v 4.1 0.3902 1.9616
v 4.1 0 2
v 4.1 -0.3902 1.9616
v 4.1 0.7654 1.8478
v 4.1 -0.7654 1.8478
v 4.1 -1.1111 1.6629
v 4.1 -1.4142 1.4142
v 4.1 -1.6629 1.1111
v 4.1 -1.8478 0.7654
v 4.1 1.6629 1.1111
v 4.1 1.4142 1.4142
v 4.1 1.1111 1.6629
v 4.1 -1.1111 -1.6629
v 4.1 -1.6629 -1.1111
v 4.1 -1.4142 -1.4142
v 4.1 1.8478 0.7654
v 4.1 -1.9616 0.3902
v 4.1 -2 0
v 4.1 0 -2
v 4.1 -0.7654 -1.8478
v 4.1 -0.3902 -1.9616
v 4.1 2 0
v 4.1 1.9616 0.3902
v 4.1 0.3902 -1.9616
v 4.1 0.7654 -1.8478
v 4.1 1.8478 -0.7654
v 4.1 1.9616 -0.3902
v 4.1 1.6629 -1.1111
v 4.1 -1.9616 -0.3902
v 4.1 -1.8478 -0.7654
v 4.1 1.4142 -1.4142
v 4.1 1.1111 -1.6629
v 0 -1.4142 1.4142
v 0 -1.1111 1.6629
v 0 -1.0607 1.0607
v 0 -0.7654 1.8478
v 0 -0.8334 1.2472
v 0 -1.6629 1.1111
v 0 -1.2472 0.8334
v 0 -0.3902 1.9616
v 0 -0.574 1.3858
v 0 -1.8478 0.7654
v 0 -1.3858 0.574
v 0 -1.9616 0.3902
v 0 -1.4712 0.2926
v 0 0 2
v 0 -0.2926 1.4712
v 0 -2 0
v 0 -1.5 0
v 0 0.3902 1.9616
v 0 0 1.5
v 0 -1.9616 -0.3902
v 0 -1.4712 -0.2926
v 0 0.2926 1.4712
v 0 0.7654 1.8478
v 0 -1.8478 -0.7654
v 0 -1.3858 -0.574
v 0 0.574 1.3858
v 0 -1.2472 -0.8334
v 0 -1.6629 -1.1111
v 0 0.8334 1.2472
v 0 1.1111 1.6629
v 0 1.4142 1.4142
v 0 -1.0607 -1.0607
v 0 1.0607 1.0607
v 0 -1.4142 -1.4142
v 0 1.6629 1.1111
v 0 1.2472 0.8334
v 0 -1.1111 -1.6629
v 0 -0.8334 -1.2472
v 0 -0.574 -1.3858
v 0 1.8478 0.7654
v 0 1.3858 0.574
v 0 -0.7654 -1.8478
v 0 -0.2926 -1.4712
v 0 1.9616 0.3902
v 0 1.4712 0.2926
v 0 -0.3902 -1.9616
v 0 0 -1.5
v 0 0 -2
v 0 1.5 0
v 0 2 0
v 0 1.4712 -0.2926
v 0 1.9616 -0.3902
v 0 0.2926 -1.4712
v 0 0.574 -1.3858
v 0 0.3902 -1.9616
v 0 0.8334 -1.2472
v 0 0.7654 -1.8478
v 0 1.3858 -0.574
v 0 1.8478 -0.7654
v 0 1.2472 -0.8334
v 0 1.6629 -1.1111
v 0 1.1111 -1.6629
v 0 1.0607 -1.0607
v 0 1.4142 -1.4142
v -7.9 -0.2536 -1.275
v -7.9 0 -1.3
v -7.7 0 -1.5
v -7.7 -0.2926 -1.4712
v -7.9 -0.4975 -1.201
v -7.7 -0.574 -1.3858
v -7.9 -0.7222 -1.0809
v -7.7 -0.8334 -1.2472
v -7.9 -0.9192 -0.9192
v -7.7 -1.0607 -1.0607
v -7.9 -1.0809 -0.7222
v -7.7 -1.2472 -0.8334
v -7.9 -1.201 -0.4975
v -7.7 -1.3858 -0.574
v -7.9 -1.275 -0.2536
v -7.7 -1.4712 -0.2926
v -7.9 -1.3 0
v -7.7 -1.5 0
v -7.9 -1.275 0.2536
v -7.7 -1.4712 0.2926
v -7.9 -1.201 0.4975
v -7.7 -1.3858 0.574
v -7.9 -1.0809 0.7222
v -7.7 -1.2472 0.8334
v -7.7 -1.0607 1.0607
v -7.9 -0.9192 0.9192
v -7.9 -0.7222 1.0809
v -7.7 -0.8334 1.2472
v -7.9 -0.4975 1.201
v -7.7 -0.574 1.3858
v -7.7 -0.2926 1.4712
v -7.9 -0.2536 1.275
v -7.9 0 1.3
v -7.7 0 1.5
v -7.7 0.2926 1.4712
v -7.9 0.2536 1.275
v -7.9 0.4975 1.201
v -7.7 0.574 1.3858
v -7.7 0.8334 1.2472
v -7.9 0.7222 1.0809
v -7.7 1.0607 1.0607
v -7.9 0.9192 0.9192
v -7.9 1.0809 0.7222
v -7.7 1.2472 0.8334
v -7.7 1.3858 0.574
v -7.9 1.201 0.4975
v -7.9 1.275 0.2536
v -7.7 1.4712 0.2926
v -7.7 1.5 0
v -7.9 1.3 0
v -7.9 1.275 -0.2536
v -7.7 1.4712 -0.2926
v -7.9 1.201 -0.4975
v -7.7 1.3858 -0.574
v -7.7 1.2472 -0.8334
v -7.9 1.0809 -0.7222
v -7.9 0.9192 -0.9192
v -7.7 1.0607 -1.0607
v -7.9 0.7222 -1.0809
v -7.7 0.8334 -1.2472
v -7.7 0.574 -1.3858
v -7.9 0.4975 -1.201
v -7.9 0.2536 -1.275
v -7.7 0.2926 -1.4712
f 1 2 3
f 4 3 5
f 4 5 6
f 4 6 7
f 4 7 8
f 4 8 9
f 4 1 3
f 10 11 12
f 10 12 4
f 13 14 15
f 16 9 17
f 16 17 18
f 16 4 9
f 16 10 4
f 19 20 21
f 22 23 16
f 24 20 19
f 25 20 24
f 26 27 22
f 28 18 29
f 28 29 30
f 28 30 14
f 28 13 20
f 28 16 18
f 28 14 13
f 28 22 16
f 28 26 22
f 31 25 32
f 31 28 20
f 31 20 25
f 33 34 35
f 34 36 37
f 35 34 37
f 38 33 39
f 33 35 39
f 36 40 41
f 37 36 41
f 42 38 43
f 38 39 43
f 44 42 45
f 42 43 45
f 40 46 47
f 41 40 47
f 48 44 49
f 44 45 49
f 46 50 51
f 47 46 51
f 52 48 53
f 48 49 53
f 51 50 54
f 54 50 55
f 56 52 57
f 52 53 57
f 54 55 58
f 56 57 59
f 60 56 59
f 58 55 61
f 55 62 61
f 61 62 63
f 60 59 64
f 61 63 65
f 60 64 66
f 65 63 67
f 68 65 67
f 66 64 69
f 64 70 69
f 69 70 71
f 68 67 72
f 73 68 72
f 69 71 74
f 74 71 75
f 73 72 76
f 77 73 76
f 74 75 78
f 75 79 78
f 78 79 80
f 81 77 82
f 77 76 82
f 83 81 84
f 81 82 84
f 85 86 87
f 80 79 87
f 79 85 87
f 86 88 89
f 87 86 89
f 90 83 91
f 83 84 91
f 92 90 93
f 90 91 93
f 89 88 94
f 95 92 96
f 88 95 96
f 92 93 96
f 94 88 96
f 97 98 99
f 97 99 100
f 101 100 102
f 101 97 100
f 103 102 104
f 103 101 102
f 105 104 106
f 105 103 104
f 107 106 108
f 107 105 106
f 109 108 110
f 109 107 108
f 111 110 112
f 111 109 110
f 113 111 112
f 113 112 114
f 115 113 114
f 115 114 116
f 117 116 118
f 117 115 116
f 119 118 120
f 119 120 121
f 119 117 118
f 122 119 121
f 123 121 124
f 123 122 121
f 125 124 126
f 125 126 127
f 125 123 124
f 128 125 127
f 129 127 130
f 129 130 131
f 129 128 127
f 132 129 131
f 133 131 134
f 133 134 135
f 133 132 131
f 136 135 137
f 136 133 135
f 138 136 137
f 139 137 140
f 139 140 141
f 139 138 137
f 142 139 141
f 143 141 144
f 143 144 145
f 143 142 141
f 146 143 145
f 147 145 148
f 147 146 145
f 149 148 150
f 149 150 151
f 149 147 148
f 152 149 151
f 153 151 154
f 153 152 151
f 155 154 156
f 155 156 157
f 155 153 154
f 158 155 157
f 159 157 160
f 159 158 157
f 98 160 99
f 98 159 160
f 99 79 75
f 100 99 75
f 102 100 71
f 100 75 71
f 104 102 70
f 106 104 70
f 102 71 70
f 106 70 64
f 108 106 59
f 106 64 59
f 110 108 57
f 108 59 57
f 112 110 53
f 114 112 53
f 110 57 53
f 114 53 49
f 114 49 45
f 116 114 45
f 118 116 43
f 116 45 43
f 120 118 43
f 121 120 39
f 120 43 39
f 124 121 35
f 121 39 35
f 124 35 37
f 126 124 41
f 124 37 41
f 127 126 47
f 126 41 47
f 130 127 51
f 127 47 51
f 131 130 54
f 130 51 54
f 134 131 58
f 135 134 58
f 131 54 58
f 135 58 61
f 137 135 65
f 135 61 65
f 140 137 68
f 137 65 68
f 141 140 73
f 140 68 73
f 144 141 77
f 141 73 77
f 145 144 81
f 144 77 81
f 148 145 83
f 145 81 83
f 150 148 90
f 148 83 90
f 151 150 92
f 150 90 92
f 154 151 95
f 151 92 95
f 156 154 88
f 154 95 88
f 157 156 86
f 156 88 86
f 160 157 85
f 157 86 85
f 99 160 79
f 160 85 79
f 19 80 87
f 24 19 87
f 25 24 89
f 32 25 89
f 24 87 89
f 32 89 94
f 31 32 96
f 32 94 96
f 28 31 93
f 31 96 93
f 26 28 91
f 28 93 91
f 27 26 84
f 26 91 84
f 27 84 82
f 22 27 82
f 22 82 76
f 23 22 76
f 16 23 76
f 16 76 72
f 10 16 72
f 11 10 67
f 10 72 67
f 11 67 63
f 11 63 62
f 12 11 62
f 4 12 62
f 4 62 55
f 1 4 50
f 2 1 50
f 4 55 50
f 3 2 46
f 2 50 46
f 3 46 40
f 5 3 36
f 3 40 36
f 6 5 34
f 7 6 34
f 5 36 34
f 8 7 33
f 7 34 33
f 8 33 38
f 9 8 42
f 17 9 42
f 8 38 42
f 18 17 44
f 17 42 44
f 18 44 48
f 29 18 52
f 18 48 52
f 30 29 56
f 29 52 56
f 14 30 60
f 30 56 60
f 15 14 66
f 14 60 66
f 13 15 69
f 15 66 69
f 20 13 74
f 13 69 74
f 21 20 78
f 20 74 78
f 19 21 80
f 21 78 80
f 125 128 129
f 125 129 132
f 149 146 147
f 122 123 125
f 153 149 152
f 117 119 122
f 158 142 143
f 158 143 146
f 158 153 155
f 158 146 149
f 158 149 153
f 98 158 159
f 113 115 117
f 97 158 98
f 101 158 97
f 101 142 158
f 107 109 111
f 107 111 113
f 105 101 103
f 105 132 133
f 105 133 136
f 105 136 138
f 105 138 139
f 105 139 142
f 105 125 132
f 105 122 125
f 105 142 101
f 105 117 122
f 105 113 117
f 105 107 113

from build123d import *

# Parameters (mm, degrees)
SKETCH1_R           = 2
BOSS_EXTRUDE1_DEPTH = 4.1
SKETCH2_R           = 1.5
BOSS_EXTRUDE2_DEPTH = 7.9
CHAMFER1_SIZE       = 0.2


with BuildPart() as part:
    # Sketch1 → Boss-Extrude1 (new body)
    with BuildSketch(Plane(origin=(0, 0, 0), x_dir=(0, 0, -1), z_dir=(1, 0, 0))):
        Circle(SKETCH1_R)
    extrude(amount=BOSS_EXTRUDE1_DEPTH)

    # Sketch2 → Boss-Extrude2 (add)
    with BuildSketch(Plane.ZY):
        with Locations(Location((0, 0, 0), (0, 0, 180))):
            Circle(SKETCH2_R)
    extrude(amount=BOSS_EXTRUDE2_DEPTH)

    # Chamfer1
    chamfer1_edges = [part.edges().sort_by_distance(p)[0] for p in [
        (-7.9, 0, 1.5),
    ]]
    chamfer(chamfer1_edges, length=CHAMFER1_SIZE)


solid = part.part
